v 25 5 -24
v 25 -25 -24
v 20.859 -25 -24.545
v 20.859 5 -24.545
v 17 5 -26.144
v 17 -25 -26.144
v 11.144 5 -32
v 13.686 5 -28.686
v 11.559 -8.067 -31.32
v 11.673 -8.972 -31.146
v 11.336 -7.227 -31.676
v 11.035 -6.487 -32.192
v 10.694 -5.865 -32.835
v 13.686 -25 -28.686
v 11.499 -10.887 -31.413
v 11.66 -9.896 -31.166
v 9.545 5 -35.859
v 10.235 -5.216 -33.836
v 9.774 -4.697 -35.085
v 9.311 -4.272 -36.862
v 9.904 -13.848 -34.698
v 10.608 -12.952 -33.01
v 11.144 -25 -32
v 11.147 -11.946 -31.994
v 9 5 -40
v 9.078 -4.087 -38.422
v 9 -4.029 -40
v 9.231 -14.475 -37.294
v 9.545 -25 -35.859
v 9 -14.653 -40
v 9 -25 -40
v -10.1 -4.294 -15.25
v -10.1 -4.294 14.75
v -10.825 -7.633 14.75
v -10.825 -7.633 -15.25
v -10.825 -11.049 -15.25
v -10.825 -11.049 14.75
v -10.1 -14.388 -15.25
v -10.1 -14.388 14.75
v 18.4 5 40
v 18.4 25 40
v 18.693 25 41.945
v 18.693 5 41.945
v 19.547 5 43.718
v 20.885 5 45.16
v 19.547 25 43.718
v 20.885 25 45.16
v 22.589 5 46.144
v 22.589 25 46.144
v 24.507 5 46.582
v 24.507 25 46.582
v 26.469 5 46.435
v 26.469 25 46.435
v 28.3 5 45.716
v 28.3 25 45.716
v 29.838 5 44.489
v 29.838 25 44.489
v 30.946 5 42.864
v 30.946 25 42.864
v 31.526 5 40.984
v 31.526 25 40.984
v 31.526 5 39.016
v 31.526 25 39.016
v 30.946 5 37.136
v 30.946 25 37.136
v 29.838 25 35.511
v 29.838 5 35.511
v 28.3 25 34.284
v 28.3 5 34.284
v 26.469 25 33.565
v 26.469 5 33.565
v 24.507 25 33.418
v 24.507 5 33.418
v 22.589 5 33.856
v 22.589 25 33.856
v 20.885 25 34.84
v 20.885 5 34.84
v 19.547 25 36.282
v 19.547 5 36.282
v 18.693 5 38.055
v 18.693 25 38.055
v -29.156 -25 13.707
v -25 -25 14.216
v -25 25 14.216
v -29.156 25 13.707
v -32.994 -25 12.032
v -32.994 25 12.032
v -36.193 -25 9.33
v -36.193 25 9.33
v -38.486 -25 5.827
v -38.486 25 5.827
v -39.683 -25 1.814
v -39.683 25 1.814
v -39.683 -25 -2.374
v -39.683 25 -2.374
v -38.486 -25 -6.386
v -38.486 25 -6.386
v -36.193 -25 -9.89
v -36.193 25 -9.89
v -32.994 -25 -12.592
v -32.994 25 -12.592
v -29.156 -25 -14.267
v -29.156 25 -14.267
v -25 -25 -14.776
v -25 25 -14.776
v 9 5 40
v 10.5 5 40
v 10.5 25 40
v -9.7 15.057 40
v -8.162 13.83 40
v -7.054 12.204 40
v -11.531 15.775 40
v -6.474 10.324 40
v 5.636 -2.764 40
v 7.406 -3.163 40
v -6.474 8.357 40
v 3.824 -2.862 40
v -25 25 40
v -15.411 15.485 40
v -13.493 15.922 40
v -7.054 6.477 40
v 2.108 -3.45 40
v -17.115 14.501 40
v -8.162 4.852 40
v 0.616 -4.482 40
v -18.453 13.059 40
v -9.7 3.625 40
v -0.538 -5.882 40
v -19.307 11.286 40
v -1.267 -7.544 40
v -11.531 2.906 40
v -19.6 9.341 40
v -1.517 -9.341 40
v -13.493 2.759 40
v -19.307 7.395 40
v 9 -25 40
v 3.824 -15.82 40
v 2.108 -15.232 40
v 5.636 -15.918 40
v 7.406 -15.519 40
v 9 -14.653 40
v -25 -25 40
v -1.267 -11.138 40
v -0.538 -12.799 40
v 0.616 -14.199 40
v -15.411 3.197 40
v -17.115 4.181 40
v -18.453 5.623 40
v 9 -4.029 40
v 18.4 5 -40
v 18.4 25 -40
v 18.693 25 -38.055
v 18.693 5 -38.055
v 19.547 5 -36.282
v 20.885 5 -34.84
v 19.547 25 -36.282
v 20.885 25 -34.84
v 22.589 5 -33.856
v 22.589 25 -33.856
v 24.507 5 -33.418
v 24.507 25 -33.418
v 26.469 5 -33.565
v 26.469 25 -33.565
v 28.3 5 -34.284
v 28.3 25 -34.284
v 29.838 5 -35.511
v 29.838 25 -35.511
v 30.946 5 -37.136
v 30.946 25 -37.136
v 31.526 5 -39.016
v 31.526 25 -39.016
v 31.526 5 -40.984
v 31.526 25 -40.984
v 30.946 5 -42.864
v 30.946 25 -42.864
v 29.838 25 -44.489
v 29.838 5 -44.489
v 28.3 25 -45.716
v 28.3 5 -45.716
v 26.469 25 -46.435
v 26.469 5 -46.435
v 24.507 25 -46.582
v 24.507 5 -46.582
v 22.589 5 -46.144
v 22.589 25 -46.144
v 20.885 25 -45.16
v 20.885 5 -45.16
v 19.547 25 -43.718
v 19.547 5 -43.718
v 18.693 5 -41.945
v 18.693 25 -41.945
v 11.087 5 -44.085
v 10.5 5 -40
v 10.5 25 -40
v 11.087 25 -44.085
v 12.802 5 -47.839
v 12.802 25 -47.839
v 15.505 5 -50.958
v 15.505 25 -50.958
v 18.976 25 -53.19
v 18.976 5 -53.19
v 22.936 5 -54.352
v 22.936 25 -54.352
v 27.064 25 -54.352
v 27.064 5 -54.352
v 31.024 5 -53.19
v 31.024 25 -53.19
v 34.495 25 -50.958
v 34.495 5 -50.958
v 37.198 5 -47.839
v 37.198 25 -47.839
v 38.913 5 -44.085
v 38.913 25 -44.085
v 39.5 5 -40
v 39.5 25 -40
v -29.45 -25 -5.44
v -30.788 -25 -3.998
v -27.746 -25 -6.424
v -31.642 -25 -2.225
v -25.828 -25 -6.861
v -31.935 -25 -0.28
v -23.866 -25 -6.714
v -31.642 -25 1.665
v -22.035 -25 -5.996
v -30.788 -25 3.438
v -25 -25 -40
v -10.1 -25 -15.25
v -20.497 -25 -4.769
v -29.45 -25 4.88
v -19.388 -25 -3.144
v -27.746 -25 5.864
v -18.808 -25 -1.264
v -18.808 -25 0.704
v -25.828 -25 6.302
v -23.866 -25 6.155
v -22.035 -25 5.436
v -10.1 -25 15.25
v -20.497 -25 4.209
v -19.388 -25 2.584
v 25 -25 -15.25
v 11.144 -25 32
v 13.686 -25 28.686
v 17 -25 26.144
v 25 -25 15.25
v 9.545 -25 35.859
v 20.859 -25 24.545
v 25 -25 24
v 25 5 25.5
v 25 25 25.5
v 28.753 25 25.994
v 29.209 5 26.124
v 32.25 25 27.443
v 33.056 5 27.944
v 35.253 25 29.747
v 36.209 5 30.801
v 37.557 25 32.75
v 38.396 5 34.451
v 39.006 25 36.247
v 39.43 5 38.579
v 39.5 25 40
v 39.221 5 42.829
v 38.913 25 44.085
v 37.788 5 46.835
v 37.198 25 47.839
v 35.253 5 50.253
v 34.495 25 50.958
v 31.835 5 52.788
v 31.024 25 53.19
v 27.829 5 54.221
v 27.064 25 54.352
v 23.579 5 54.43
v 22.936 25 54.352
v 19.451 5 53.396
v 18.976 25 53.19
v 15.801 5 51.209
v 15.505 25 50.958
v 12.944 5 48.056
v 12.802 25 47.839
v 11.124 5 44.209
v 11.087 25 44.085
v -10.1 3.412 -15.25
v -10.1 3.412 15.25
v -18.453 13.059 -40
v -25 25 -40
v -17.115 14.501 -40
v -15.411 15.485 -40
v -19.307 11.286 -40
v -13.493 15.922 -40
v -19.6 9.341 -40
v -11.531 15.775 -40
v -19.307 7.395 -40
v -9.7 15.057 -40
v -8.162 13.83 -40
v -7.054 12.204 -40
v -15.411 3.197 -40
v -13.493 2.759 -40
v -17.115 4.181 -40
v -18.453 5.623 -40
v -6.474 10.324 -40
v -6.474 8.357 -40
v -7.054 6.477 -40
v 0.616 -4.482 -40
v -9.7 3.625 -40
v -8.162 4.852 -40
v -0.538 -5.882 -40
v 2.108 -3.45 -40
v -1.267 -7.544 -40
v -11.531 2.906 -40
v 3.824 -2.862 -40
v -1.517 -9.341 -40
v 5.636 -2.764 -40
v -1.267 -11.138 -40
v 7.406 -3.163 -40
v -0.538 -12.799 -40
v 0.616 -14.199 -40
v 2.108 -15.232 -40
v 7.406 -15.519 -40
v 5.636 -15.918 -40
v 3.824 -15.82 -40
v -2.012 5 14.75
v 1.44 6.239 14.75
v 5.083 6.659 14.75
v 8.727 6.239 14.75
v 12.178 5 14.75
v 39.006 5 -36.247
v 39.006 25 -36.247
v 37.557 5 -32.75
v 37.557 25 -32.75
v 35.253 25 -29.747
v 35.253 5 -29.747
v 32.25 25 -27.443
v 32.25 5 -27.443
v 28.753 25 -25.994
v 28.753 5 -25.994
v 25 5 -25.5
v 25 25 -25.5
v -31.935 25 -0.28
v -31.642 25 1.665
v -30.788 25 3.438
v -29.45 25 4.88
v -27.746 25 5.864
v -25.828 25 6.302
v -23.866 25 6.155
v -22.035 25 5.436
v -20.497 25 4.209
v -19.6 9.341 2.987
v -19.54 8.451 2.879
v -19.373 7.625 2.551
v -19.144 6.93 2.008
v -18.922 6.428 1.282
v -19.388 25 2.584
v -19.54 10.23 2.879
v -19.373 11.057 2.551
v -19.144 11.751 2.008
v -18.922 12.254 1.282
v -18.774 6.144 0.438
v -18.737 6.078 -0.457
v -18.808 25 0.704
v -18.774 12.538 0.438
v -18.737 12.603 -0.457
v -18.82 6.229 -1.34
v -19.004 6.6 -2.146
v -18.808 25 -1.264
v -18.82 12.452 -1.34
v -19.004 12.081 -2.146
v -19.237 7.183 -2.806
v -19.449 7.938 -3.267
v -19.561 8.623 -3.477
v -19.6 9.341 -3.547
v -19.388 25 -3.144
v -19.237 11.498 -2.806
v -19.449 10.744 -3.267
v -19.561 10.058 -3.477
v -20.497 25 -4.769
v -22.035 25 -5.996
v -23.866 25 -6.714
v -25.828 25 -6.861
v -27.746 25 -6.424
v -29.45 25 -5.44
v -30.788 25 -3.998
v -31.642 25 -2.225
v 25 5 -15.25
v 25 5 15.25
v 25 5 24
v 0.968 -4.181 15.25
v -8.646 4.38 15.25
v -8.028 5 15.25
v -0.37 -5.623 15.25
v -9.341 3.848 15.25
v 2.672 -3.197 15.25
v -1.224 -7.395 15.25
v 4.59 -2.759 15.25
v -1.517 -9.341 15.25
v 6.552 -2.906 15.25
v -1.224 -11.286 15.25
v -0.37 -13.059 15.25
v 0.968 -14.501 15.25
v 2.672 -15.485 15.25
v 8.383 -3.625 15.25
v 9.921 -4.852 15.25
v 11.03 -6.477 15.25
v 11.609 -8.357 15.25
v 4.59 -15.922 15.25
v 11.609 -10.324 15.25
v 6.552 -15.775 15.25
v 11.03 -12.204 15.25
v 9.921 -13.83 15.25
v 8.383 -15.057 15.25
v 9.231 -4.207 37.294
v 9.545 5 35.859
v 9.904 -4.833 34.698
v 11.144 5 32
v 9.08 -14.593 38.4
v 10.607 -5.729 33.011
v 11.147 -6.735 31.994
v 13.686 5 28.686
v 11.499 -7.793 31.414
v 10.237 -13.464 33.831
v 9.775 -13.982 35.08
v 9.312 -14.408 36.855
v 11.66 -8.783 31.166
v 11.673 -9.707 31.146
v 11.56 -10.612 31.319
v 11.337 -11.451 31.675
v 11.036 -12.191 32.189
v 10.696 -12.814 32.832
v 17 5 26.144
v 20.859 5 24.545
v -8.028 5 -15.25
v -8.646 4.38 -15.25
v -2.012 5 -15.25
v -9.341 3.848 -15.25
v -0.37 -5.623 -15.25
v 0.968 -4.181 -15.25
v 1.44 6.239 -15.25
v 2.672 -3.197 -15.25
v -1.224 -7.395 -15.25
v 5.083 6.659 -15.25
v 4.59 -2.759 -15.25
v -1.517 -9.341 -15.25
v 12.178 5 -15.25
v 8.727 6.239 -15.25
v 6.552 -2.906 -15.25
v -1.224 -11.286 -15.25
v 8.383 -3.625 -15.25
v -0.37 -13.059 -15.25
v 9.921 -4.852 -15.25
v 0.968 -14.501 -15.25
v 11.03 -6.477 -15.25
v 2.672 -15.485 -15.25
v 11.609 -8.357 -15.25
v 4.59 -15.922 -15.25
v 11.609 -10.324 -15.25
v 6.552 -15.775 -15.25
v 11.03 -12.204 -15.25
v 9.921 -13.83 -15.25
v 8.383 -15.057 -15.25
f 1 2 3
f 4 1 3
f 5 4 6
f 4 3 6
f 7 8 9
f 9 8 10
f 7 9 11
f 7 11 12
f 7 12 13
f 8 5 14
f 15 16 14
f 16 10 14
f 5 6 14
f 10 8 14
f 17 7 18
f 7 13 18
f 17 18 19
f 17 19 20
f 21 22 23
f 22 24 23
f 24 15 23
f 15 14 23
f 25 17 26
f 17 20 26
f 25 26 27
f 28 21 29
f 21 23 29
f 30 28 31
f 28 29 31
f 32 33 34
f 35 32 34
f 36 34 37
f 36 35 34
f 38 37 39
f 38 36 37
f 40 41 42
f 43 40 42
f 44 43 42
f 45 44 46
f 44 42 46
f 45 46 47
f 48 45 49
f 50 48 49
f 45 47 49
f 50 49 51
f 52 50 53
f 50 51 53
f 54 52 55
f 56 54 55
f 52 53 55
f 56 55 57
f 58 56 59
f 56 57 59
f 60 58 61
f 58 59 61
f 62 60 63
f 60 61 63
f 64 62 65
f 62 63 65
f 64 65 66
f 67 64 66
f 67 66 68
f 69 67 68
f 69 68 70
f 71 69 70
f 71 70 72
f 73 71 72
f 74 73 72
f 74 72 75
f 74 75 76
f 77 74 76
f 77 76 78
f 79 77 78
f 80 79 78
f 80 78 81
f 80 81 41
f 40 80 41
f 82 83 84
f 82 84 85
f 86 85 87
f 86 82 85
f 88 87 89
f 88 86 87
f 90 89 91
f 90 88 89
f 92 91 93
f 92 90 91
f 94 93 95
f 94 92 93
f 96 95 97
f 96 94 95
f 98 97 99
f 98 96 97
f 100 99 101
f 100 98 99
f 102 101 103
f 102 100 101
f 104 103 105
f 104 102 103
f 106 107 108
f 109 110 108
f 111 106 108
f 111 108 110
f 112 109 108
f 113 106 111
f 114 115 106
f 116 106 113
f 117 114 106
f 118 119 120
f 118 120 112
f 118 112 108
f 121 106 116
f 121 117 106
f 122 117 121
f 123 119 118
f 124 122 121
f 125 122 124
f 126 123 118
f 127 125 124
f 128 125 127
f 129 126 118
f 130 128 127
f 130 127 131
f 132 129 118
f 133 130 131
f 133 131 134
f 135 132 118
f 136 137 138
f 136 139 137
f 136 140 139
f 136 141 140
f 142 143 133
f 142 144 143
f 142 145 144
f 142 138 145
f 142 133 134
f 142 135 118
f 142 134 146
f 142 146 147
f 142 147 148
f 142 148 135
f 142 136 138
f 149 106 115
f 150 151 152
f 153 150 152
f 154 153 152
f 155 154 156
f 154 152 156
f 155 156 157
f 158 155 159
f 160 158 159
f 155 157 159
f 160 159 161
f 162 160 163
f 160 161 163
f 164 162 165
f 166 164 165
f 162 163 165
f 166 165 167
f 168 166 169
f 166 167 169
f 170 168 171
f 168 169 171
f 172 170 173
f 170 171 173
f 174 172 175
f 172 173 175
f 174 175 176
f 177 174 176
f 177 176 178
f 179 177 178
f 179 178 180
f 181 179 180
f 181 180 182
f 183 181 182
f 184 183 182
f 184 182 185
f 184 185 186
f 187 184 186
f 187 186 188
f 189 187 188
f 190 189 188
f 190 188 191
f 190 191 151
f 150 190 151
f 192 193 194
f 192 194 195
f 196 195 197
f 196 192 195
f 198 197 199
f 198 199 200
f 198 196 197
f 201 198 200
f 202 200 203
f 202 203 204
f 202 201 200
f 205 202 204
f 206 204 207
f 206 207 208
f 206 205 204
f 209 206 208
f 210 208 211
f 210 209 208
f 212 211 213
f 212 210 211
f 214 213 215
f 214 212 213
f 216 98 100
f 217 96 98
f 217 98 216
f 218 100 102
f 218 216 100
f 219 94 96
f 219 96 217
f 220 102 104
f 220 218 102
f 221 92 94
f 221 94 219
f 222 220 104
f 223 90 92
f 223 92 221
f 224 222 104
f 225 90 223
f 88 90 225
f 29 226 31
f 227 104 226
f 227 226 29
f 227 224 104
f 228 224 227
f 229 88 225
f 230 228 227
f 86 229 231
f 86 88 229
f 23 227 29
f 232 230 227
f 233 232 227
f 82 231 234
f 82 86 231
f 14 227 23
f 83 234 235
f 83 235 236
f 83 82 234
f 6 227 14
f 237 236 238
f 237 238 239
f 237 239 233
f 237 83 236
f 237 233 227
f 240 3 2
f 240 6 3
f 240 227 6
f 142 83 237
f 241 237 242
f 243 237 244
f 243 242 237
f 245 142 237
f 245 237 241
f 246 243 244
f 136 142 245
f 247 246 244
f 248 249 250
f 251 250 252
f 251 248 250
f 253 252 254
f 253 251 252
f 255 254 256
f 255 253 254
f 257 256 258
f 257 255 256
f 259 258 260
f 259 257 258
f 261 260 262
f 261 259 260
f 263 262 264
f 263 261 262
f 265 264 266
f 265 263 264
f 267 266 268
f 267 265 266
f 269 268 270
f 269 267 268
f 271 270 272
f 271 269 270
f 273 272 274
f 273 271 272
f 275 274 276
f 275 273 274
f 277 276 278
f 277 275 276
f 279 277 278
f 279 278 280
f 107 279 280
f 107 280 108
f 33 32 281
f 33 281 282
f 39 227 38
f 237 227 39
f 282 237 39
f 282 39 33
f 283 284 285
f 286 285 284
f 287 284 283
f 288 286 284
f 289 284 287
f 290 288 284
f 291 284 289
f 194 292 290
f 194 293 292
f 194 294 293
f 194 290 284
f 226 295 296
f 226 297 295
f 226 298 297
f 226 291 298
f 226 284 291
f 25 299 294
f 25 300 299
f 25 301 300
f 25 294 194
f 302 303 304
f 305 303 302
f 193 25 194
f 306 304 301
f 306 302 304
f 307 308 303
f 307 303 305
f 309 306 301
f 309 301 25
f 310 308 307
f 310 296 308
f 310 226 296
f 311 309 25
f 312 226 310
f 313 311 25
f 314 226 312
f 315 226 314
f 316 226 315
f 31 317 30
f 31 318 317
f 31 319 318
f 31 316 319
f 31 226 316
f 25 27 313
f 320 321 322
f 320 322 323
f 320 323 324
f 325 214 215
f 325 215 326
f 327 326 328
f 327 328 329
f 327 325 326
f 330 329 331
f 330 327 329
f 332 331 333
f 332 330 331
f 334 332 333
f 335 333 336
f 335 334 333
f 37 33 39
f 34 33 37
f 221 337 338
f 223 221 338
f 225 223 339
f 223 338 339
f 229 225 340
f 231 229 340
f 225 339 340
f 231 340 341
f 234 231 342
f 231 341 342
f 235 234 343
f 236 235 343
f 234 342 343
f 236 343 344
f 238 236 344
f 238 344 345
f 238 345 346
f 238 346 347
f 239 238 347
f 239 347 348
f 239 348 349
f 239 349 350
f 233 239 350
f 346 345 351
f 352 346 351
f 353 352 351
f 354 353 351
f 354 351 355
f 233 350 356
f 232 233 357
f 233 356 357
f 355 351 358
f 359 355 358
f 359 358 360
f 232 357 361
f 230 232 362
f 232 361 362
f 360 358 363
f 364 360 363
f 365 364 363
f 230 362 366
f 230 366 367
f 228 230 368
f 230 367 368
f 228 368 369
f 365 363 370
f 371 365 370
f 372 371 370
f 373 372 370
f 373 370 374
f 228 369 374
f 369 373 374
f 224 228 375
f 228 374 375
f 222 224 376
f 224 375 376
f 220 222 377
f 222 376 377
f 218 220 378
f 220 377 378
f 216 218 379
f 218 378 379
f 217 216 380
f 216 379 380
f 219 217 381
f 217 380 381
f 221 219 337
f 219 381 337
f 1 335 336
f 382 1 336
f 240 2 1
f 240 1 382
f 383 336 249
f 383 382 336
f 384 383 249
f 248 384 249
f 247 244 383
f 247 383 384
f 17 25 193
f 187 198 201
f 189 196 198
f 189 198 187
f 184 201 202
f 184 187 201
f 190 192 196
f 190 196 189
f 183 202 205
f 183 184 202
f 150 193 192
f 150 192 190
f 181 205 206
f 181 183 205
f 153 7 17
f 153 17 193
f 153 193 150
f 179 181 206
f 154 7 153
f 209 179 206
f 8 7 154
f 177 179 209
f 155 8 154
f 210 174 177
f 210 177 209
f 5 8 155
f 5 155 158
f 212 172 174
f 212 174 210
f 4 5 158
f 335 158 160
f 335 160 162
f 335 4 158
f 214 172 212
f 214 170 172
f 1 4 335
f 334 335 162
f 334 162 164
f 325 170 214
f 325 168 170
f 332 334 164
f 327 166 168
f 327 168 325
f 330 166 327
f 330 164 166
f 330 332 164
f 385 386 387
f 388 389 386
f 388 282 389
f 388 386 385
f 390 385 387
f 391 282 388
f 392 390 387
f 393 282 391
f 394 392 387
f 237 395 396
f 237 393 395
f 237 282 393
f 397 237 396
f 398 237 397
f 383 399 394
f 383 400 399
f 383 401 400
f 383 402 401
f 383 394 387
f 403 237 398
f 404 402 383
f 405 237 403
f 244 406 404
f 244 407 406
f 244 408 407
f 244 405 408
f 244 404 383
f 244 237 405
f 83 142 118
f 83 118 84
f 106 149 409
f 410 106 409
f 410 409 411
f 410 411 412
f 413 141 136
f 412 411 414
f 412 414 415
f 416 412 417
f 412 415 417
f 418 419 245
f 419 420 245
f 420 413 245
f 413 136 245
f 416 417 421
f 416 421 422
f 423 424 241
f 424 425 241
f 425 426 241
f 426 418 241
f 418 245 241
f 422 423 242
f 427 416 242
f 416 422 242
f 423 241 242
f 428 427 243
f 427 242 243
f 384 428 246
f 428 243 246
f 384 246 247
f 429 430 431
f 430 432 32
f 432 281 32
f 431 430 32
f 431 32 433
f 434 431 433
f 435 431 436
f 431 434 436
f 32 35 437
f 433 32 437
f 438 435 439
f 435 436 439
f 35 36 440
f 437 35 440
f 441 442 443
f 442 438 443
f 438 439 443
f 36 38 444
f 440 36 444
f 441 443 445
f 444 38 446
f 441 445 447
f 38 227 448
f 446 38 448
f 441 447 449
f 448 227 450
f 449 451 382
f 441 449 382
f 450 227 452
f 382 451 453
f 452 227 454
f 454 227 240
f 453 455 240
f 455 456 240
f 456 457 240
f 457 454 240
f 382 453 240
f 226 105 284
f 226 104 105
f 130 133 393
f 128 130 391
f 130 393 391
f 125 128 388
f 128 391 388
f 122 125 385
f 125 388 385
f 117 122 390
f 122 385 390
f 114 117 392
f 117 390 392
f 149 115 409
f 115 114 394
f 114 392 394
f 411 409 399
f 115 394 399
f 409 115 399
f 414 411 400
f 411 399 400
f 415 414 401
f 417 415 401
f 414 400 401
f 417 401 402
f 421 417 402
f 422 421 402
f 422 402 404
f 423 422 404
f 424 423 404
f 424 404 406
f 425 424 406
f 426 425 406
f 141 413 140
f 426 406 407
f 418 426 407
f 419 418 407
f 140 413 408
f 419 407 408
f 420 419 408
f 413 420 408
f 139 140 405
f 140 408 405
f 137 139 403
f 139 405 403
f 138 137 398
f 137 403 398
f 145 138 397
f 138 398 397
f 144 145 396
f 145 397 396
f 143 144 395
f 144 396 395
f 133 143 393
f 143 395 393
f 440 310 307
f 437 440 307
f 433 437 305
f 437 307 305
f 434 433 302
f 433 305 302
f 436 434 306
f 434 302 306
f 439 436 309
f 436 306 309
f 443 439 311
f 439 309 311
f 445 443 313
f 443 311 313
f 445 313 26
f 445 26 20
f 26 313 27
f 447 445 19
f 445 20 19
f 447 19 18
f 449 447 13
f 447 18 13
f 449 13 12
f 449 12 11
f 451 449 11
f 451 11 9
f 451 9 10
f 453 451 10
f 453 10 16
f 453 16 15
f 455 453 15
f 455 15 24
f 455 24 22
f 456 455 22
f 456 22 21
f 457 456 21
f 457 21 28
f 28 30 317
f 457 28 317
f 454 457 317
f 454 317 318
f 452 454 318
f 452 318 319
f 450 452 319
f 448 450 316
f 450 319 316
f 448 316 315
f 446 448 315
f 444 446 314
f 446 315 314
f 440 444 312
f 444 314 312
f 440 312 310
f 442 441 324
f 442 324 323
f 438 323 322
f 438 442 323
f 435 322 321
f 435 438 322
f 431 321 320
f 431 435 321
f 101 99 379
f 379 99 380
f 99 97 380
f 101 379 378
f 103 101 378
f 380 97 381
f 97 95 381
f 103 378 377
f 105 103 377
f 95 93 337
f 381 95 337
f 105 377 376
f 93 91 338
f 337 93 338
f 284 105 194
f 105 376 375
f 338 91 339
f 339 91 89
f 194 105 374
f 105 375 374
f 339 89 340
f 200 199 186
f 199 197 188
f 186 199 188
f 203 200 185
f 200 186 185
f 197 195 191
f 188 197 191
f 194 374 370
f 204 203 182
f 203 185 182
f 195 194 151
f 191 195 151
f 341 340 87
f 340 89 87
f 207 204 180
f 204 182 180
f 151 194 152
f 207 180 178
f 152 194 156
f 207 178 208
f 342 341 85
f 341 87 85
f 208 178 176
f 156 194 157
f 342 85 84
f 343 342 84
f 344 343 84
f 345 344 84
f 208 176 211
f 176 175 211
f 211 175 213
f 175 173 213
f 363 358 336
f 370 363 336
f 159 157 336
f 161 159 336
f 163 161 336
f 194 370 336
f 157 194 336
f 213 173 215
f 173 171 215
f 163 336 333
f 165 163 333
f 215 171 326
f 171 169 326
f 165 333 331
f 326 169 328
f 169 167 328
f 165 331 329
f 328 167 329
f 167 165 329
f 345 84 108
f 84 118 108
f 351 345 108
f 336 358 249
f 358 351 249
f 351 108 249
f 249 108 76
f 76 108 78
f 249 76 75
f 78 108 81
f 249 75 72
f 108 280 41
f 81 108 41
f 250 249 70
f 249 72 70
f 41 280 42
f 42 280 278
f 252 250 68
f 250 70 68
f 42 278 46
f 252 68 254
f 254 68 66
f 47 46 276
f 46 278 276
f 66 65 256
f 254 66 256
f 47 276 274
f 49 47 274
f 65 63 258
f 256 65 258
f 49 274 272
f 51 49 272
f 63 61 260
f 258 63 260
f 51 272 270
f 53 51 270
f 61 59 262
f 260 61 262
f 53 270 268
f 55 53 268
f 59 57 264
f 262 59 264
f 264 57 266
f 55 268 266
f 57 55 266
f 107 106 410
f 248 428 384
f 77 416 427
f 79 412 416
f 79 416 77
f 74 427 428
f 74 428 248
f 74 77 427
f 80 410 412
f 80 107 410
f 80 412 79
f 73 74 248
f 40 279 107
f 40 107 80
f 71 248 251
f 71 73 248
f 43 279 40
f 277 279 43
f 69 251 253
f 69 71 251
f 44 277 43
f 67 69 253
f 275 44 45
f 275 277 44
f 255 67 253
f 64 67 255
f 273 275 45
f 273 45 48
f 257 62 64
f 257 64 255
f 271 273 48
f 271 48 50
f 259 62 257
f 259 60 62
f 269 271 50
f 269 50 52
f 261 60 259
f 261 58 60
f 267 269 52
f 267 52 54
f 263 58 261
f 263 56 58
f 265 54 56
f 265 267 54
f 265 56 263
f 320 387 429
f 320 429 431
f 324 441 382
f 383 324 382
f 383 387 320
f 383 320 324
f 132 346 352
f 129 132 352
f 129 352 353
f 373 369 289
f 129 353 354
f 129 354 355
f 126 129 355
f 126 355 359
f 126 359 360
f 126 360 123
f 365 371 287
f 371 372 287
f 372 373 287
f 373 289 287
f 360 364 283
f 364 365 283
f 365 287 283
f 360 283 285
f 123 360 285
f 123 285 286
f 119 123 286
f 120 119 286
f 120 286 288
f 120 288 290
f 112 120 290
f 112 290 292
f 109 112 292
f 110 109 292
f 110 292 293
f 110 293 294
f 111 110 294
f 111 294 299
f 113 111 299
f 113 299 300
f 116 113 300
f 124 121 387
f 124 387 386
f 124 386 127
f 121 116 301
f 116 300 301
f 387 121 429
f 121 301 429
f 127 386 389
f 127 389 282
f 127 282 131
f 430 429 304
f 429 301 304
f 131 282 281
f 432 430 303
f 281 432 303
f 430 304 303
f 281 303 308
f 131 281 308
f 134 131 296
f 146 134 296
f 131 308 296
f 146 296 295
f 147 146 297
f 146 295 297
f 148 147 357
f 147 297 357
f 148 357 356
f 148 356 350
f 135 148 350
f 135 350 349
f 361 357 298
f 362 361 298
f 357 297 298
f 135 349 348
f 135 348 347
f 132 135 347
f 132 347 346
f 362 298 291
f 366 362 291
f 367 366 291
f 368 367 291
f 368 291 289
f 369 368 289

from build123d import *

# Parameters (mm, degrees)
F1_DEPTH       = 25
F3_D           = 13.2
F3_CBORE_D     = 19.25
F3_CBORE_DEPTH = 0
F5_D           = 13.2
F5_CBORE_D     = 19.25
F5_CBORE_DEPTH = 0
F6_W           = 40
F6_H           = 30.5
F7_DEPTH       = 30
F8_R           = 16
F9_DEPTH       = 30
F10_R          = 16
F11_DEPTH      = 30


with BuildPart() as f1:
    # F0 (on Front) → F1 (new body, symmetric)
    with BuildSketch(Plane.XZ):
        with BuildLine():
            Line((25, -25.5), (25, -40))
            Line((25, -40), (10.5, -40))
            ThreePointArc((10.5, -40), (25, -54.5), (39.5, -40))
            ThreePointArc((39.5, -40), (35.2530483272, -29.7469516728), (25, -25.5))
        make_face()
        with BuildLine():
            Line((10.5, -40), (25, -40))
            Line((25, -40), (25, -25.5))
            ThreePointArc((25, -25.5), (14.7469516728, -29.7469516728), (10.5, -40))
        make_face()
        with BuildLine():
            Line((-25, -40), (10.5, -40))
            ThreePointArc((10.5, -40), (14.7469516728, -29.7469516728), (25, -25.5))
            Line((25, -25.5), (25, 25.5))
            ThreePointArc((25, 25.5), (14.7469516728, 29.7469516728), (10.5, 40))
            Line((10.5, 40), (-25, 40))
            Line((-25, 40), (-25, 14.2162181315))
            ThreePointArc((-25, 14.2162181315), (-14.9640357801, 9.8540823977), (-10.8347666082, -0.279916916))
            ThreePointArc((-10.8347666082, -0.279916916), (-14.9640357801, -10.4139162298), (-25, -14.7760519636))
            Line((-25, -14.7760519636), (-25, -40))
        make_face()
        with BuildLine():
            ThreePointArc((10.5, 40), (14.7469516728, 29.7469516728), (25, 25.5))
            Line((25, 25.5), (25, 40))
            Line((25, 40), (10.5, 40))
        make_face()
        with BuildLine():
            Line((25, 40), (25, 25.5))
            ThreePointArc((25, 25.5), (35.2530483272, 29.7469516728), (39.5, 40))
            ThreePointArc((39.5, 40), (25, 54.5), (10.5, 40))
            Line((10.5, 40), (25, 40))
        make_face()
        with BuildLine():
            ThreePointArc((-25, 14.2162181315), (-39.8347666082, -0.279916916), (-25, -14.7760519636))
            Line((-25, -14.7760519636), (-25, 14.2162181315))
        make_face()
        with BuildLine():
            Line((-25, 14.2162181315), (-25, -14.7760519636))
            ThreePointArc((-25, -14.7760519636), (-14.9640357801, -10.4139162298), (-10.8347666082, -0.279916916))
            ThreePointArc((-10.8347666082, -0.279916916), (-14.9640357801, 9.8540823977), (-25, 14.2162181315))
        make_face()
    extrude(amount=F1_DEPTH, both=True)

    # F3 (through all)
    with Locations(Plane.XZ.offset(25)):
        with Locations((25, 40), (-25.3347666082, -0.279916916), (25, -40)):
            CounterBoreHole(F3_D / 2, F3_CBORE_D / 2, F3_CBORE_DEPTH)

    # F5 (through all)
    with Locations(Plane.XY.offset(40)):
        with Locations((-13, 9.3407420599), (5.0832007976, -9.3407420599)):
            CounterBoreHole(F5_D / 2, F5_CBORE_D / 2, F5_CBORE_DEPTH)

    # F6 (on face) → F7 (cut)
    with BuildSketch(Plane.XZ.offset(25)):
        with Locations((9.9, 0)):
            Rectangle(F6_W, F6_H)
    extrude(amount=-F7_DEPTH, mode=Mode.SUBTRACT)

    # F8 (on face) → F9 (cut)
    with BuildSketch(Plane.XY.offset(-15.25)):
        with Locations((5.0832007976, -9.3407420599)):
            Circle(F8_R)
    extrude(amount=F9_DEPTH, mode=Mode.SUBTRACT)

    # F10 (on face) → F11 (cut)
    with BuildSketch(Plane.XZ.offset(25)):
        with Locations((25, 40)):
            Circle(F10_R)
        with Locations((25, -40)):
            Circle(F10_R)
    extrude(amount=-F11_DEPTH, mode=Mode.SUBTRACT)


solid = f1.part
